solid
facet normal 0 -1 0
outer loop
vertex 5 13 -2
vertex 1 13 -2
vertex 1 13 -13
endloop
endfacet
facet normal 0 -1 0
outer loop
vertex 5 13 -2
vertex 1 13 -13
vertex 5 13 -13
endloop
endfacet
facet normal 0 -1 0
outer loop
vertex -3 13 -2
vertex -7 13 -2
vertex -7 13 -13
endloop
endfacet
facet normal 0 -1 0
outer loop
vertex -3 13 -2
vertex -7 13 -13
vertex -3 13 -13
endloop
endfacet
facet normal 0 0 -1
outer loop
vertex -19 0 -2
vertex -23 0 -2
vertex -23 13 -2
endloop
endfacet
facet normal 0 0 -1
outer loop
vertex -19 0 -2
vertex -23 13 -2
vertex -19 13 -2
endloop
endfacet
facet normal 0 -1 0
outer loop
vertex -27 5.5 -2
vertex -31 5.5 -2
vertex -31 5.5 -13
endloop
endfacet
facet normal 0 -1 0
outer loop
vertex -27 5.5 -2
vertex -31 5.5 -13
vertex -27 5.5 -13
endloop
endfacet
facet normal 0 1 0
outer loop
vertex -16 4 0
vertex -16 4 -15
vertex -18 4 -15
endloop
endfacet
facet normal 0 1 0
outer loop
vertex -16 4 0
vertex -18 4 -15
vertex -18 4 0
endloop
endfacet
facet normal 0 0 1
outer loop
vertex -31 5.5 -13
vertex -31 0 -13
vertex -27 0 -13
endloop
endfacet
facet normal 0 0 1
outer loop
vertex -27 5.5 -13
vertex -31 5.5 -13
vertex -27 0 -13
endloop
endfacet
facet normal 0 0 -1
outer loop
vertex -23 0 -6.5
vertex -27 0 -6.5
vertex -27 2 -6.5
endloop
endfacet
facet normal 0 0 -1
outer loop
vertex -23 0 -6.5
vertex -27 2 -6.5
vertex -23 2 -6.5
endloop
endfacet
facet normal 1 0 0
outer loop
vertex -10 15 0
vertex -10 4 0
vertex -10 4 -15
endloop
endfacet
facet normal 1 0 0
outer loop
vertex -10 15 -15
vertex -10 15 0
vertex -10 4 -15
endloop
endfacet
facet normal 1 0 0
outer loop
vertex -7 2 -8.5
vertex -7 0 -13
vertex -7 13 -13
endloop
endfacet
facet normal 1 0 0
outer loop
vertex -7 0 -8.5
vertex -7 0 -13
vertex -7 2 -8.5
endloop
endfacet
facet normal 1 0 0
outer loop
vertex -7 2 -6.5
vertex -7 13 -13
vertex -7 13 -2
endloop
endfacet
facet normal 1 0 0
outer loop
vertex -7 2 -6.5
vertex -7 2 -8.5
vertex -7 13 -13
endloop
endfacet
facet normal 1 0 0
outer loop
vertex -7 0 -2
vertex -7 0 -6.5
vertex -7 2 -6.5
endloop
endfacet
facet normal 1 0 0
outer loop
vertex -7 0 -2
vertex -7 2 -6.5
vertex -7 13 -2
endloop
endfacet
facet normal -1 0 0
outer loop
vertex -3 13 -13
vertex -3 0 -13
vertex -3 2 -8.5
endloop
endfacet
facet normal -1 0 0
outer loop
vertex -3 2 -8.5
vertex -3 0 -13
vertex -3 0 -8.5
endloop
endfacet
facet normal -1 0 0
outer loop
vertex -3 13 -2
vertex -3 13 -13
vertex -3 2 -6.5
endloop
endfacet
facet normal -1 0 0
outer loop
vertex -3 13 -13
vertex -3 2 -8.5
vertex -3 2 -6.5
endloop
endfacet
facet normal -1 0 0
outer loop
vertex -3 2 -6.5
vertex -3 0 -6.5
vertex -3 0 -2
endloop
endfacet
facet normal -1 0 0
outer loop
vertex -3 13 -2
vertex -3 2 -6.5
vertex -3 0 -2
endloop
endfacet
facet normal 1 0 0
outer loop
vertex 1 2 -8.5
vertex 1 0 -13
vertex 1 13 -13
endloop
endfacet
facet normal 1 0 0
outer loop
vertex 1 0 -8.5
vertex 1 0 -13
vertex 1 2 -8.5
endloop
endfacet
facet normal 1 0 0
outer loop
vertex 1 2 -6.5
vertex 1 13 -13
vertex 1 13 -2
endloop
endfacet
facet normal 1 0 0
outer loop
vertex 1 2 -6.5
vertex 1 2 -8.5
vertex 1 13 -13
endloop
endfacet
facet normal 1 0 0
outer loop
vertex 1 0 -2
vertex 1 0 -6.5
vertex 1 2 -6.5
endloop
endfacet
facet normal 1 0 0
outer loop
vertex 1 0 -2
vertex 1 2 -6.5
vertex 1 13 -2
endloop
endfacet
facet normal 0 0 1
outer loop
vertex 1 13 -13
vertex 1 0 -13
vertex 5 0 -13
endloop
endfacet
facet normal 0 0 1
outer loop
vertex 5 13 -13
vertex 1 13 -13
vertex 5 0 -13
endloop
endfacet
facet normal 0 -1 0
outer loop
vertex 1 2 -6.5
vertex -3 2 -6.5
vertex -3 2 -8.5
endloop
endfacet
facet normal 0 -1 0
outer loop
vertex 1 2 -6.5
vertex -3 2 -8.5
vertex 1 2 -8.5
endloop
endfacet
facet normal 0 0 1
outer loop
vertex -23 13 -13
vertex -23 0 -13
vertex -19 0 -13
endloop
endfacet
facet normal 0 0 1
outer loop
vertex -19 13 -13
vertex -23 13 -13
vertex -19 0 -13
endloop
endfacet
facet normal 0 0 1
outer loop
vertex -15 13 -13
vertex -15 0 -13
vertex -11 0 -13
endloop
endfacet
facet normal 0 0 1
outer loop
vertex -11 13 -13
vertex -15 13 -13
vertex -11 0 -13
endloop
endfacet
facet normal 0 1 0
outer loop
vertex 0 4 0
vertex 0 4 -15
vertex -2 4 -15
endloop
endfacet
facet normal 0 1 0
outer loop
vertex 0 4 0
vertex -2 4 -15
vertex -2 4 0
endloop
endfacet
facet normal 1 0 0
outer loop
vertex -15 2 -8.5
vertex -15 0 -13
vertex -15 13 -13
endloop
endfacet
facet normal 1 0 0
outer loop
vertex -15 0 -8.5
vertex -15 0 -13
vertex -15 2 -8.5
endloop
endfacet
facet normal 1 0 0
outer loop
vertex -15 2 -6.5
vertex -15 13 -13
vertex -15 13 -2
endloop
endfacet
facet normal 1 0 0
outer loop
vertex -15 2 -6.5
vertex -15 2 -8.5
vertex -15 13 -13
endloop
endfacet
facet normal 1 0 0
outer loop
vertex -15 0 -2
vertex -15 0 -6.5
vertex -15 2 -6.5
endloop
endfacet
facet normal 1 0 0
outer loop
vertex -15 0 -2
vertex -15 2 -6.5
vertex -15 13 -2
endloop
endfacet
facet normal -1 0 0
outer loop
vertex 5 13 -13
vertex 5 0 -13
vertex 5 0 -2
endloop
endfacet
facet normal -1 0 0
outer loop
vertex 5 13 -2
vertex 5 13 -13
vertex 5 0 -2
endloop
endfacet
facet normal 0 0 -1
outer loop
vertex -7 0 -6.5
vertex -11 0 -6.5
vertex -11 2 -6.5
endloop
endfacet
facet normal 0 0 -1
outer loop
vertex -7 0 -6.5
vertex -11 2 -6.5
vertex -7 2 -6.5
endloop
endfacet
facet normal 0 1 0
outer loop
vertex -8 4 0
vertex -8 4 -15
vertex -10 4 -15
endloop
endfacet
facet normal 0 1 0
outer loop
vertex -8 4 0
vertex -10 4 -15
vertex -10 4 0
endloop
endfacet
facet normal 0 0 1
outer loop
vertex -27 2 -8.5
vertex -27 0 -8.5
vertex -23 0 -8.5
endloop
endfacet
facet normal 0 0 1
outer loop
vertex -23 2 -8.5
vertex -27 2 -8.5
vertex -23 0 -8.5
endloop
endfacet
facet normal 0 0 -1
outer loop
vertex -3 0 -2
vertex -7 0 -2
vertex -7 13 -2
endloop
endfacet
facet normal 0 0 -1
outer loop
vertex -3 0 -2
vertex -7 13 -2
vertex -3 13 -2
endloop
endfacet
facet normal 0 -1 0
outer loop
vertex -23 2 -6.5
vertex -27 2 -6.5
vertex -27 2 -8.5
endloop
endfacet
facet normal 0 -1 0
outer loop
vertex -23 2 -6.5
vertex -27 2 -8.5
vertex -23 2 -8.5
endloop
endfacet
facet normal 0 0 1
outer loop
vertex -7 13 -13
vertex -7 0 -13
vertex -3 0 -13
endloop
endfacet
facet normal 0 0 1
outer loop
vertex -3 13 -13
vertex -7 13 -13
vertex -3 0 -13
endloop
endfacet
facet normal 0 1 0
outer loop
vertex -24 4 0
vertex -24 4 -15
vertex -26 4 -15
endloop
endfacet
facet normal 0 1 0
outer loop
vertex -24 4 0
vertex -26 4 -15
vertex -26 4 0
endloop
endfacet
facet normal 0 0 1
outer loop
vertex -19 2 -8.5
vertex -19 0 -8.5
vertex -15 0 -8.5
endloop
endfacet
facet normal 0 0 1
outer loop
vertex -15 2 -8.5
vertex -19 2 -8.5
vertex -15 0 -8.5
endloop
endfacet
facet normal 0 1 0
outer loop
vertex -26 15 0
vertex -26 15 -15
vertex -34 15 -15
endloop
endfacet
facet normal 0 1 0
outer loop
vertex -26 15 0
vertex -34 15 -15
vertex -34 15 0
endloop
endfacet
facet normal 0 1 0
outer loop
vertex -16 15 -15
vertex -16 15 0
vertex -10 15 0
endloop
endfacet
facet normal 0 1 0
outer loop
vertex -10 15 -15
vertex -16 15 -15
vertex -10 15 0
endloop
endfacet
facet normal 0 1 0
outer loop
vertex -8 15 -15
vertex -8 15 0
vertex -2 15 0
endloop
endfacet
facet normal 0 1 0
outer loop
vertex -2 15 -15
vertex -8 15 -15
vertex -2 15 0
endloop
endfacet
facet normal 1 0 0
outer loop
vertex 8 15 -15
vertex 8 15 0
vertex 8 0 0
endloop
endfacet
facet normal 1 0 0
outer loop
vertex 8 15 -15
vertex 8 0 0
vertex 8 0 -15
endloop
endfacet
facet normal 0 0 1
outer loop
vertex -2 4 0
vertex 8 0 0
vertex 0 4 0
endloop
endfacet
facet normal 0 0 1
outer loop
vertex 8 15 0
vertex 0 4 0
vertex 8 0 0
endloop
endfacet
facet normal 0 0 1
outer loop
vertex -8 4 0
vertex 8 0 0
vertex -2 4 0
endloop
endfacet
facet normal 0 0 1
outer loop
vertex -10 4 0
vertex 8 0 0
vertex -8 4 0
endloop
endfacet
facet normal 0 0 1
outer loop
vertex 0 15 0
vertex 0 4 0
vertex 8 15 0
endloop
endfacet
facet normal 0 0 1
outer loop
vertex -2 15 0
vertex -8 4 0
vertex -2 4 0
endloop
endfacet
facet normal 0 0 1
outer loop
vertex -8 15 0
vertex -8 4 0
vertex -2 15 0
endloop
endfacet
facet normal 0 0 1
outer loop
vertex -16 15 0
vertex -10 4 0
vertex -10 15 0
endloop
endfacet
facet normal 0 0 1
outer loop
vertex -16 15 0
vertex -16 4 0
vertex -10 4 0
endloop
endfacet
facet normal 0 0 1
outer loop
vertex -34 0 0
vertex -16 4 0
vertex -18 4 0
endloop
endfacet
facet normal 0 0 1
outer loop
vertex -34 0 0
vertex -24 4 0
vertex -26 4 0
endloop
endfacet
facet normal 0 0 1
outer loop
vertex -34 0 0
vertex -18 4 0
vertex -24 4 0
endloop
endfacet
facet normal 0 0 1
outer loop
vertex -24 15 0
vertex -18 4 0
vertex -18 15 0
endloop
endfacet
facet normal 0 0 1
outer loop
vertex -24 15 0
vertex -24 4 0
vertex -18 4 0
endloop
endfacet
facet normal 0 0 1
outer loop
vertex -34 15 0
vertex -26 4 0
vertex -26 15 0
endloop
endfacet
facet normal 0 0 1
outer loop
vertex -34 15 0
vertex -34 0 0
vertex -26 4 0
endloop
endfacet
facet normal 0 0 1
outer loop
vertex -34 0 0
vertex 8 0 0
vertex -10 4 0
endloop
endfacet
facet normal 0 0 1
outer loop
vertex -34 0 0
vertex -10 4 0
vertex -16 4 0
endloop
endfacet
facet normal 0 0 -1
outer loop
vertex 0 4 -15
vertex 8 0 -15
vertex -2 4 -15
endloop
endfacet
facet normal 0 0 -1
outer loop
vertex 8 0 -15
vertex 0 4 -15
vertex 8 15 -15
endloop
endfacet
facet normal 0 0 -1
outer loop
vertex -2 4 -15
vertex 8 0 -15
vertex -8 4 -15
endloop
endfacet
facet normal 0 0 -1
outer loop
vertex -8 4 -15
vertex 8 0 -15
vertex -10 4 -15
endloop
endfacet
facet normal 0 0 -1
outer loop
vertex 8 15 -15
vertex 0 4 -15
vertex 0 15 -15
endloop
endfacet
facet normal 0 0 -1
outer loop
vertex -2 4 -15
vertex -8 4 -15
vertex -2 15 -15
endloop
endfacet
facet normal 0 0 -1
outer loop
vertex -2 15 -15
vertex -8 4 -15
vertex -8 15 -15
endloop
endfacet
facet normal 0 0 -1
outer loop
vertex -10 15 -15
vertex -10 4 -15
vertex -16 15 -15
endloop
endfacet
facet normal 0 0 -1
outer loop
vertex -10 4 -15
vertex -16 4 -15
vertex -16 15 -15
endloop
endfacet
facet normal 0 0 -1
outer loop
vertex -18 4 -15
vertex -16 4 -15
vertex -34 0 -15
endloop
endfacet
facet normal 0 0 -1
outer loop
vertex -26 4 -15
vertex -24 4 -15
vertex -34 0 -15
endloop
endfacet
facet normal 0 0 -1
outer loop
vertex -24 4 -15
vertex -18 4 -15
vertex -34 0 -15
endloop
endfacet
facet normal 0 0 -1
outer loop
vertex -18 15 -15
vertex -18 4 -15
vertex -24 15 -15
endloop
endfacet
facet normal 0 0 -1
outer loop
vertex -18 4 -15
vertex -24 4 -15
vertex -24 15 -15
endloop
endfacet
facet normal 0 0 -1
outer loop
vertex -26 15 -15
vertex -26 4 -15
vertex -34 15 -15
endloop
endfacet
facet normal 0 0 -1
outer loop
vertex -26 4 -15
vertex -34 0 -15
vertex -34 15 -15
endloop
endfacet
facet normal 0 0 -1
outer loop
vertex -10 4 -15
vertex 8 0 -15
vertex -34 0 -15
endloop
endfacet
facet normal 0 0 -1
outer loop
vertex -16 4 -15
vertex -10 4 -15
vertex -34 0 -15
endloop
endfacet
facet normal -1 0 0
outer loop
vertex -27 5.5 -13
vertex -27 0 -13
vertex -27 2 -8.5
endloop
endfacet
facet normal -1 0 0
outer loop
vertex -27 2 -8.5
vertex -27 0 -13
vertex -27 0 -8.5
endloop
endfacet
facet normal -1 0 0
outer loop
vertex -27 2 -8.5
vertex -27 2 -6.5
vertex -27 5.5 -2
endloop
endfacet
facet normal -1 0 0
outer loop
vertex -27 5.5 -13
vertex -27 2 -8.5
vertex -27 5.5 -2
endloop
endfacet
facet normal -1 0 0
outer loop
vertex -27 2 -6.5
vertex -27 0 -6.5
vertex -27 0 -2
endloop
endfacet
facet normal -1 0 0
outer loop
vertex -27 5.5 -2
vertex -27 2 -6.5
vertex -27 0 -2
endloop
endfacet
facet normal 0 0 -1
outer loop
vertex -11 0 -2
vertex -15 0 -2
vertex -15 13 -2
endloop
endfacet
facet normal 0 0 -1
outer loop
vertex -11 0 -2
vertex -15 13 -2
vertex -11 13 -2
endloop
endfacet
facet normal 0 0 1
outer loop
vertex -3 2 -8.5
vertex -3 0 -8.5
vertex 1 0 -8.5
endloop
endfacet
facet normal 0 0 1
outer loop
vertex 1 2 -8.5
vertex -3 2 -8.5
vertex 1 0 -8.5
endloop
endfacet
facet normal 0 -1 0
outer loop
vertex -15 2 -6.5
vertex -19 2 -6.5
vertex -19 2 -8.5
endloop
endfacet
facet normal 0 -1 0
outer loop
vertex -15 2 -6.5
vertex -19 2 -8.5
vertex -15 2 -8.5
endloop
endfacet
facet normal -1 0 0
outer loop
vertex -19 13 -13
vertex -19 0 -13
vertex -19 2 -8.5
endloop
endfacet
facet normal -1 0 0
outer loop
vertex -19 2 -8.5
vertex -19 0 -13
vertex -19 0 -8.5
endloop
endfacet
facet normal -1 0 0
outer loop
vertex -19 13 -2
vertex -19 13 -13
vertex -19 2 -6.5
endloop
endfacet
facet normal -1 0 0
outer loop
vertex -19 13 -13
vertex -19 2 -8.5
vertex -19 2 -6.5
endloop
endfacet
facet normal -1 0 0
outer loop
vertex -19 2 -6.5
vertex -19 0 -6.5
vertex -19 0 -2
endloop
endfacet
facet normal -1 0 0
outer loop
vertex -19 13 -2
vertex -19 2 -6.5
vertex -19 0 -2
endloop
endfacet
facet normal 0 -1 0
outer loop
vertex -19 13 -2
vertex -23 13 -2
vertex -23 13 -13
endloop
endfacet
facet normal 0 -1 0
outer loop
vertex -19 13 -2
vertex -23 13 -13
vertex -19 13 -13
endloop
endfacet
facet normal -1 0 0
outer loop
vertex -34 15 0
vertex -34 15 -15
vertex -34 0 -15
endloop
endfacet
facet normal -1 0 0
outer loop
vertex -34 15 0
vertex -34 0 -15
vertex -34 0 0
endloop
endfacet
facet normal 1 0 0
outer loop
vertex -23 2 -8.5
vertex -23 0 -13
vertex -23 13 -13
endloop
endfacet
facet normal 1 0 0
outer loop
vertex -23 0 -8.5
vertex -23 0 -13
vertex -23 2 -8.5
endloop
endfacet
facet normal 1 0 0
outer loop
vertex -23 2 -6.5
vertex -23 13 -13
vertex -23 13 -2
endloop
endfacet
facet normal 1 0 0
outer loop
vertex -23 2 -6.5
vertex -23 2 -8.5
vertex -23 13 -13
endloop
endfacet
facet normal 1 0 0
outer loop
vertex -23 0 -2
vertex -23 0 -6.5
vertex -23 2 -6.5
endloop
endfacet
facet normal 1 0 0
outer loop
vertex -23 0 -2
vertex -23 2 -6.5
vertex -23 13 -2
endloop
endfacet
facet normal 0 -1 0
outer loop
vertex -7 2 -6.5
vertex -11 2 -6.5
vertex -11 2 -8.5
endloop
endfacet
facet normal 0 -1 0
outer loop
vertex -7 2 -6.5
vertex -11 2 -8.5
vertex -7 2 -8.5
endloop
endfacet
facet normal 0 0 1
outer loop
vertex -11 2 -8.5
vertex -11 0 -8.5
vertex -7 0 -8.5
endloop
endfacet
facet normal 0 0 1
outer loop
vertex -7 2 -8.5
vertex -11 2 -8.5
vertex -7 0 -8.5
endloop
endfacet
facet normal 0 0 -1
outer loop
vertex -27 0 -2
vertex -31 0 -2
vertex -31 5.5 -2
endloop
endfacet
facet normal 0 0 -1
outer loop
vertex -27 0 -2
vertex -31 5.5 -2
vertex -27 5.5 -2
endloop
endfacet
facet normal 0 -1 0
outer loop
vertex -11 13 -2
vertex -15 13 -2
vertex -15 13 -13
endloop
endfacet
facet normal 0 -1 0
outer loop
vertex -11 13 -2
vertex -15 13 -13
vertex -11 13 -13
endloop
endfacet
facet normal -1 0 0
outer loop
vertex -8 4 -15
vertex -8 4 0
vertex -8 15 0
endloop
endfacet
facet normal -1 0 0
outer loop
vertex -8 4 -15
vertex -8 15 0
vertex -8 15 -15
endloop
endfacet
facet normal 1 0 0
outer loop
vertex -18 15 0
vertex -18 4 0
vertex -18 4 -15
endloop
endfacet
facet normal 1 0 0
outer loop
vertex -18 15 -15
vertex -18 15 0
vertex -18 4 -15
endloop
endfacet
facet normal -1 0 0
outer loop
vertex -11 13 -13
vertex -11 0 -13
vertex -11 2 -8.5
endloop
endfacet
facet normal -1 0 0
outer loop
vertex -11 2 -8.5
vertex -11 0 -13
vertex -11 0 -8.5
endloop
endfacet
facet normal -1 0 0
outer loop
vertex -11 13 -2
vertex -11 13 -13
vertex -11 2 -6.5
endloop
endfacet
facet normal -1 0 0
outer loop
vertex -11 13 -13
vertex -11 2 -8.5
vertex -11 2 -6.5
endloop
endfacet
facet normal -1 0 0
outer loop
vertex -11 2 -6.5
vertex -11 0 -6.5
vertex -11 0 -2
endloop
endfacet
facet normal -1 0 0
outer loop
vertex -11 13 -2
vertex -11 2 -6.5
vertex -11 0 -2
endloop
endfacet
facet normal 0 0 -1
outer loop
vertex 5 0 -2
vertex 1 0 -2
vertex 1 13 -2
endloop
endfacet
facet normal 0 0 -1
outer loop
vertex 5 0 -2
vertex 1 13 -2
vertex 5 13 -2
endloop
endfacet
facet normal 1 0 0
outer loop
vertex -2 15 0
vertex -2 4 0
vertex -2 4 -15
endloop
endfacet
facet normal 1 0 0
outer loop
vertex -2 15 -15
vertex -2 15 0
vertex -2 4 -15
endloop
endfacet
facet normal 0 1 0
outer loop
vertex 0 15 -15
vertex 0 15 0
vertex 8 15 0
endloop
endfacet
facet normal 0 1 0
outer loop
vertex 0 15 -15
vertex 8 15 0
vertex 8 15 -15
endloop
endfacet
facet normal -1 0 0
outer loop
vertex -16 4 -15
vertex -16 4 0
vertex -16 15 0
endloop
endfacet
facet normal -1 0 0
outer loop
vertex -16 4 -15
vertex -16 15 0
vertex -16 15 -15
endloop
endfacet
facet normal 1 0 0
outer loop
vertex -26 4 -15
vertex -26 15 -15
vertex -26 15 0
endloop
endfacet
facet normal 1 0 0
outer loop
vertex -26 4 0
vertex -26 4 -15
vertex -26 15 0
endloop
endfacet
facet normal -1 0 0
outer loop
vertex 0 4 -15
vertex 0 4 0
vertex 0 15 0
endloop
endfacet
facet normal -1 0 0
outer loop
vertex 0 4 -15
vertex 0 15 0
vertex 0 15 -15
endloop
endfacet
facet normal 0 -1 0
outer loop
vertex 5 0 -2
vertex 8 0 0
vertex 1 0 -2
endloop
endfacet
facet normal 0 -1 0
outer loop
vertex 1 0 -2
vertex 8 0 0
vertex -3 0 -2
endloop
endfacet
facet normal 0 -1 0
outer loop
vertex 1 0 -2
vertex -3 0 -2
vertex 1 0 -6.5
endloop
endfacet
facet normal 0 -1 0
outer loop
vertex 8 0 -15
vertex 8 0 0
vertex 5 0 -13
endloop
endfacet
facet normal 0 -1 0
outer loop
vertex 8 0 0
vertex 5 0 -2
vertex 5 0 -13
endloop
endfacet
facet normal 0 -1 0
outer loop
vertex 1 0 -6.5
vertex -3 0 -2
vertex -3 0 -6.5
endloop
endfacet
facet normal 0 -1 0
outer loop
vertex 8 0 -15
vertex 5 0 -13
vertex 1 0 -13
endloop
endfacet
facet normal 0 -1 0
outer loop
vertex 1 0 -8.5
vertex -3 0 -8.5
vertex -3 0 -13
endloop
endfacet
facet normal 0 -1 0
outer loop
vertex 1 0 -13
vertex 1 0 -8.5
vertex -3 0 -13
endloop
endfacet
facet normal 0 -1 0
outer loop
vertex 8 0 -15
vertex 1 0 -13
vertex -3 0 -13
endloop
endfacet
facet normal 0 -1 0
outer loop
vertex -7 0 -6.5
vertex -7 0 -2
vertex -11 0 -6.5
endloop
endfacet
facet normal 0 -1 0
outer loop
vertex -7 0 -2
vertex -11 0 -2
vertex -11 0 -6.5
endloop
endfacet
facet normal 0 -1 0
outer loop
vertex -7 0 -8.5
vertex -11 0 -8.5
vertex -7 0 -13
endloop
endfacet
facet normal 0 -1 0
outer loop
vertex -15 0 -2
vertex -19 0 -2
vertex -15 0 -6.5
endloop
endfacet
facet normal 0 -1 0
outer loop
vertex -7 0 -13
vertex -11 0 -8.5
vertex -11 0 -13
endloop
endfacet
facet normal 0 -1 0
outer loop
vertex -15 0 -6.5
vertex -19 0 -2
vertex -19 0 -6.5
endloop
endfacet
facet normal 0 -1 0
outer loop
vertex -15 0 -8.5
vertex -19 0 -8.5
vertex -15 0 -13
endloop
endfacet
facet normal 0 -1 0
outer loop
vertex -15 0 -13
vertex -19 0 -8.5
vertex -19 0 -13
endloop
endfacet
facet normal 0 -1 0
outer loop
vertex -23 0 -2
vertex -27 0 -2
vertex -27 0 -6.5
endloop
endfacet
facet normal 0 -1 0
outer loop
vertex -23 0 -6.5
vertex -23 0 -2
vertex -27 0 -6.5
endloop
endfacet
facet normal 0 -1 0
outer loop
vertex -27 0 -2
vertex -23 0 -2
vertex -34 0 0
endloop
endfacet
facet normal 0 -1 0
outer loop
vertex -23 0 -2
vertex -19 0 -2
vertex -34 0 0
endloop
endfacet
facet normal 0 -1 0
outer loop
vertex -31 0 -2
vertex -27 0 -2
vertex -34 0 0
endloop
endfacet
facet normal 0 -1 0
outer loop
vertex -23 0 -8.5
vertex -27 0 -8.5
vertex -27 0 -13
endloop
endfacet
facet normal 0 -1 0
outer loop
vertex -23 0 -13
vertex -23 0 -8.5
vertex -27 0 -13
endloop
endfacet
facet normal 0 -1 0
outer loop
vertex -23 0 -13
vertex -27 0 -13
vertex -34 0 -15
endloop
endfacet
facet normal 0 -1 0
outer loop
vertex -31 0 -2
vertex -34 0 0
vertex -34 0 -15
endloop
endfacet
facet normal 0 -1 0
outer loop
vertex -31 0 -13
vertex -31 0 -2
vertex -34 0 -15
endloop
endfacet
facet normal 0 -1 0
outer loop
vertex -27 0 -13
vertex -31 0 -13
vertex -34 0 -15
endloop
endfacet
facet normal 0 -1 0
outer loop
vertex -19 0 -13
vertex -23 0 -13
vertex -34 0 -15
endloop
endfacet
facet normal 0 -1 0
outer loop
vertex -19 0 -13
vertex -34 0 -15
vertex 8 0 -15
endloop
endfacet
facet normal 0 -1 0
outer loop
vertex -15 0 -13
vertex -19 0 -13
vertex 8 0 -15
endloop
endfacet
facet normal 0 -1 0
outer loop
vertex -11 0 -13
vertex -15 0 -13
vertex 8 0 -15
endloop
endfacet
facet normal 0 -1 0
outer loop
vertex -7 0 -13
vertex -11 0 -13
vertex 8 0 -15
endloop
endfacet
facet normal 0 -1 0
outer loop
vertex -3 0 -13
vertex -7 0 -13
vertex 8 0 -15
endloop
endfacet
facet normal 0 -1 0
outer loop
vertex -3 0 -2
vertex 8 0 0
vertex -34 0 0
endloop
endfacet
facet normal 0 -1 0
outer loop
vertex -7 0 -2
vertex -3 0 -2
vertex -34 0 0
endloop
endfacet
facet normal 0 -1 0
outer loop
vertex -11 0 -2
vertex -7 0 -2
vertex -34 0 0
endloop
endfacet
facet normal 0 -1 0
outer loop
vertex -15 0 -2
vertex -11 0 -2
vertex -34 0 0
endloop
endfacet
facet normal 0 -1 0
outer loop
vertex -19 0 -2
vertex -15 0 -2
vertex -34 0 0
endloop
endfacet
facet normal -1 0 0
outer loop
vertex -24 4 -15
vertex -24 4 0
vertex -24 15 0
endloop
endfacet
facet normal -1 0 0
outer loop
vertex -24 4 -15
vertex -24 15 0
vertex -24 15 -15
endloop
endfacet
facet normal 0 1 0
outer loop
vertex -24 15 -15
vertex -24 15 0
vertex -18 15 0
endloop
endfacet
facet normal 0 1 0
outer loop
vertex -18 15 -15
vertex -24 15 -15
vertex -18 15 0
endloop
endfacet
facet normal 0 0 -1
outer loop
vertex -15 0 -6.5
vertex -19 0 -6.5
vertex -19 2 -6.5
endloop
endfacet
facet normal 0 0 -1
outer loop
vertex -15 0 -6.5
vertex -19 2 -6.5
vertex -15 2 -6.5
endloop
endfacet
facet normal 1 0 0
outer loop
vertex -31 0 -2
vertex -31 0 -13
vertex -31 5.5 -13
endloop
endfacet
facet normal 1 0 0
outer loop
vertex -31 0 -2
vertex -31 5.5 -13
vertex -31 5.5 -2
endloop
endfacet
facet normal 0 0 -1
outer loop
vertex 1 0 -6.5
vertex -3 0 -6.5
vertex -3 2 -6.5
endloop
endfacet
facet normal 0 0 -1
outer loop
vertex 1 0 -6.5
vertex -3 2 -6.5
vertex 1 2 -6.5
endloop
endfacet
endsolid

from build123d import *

# Parameters (mm, degrees)
SKETCH1_W           = 6
SKETCH1_H           = 15
BOSS_EXTRUDE1_DEPTH = 15
SKETCH2_W           = 4
SKETCH2_H           = 11
CUT_EXTRUDE1_DEPTH  = 13
SKETCH3_W           = 15
SKETCH3_H           = 4
BOSS_EXTRUDE2_DEPTH = 2
LPATTERN1_COUNT     = 4
LPATTERN1_PITCH     = 8
SKETCH4_W           = 15
SKETCH4_H           = 15
BOSS_EXTRUDE3_DEPTH = 8
SKETCH5_W           = 4
SKETCH5_H           = 11
CUT_EXTRUDE2_DEPTH  = 5.5
SKETCH6_W           = 15
SKETCH6_H           = 15
BOSS_EXTRUDE4_DEPTH = 2
SKETCH7_W           = 36
SKETCH7_H           = 2
CUT_EXTRUDE3_DEPTH  = 2


with BuildPart() as part:
    # Sketch1 → Boss-Extrude1 (new body)
    with BuildSketch(Plane(origin=(0, 0, 0), x_dir=(1, 0, 0), z_dir=(0, 1, 0))):
        with Locations((3, 7.5)):
            Rectangle(SKETCH1_W, SKETCH1_H)
    extrude(amount=BOSS_EXTRUDE1_DEPTH)

    # Sketch2 → Cut-Extrude1 (cut)
    with BuildSketch(Plane.XZ):
        with Locations((3, -7.5)):
            Rectangle(SKETCH2_W, SKETCH2_H)
    extrude(amount=-CUT_EXTRUDE1_DEPTH, mode=Mode.SUBTRACT)

    # Sketch3 → Boss-Extrude2 (add)
    with BuildSketch(Plane.ZY):
        with Locations((-7.5, 2)):
            Rectangle(SKETCH3_W, SKETCH3_H)
    extrude(amount=BOSS_EXTRUDE2_DEPTH)


with BuildPart() as lpattern1_1:
    # LPattern1: pattern copy
    add(part.part.moved(Location(Vector(-1, 0, 0) * (1 * LPATTERN1_PITCH))))


with BuildPart() as lpattern1_2:
    # LPattern1: pattern copy
    add(part.part.moved(Location(Vector(-1, 0, 0) * (2 * LPATTERN1_PITCH))))


with BuildPart() as lpattern1_3:
    # LPattern1: pattern copy
    add(part.part.moved(Location(Vector(-1, 0, 0) * (3 * LPATTERN1_PITCH))))

    # Sketch4 → Boss-Extrude3 (add)
    with BuildSketch(Plane.ZY.offset(26)):
        with Locations((-7.5, 7.5)):
            Rectangle(SKETCH4_W, SKETCH4_H)
    extrude(amount=BOSS_EXTRUDE3_DEPTH)

    # Sketch5 → Cut-Extrude2 (cut)
    with BuildSketch(Plane.XZ):
        with Locations((-29, -7.5)):
            Rectangle(SKETCH5_W, SKETCH5_H)
    extrude(amount=-CUT_EXTRUDE2_DEPTH, mode=Mode.SUBTRACT)


with BuildPart() as lpattern1_1_1:
    add(lpattern1_1.part)

    # Combine1: union LPattern1_2, LPattern1_3, part
    add(lpattern1_2.part)
    add(lpattern1_3.part)
    add(part.part)

    # Sketch6 → Boss-Extrude4 (add)
    with BuildSketch(Plane(origin=(6, 0, 0), x_dir=(0, 0, -1), z_dir=(1, 0, 0))):
        with Locations((7.5, 7.5)):
            Rectangle(SKETCH6_W, SKETCH6_H)
    extrude(amount=BOSS_EXTRUDE4_DEPTH)

    # Sketch7 → Cut-Extrude3 (cut)
    with BuildSketch(Plane.XZ):
        with Locations((-13, -7.5)):
            Rectangle(SKETCH7_W, SKETCH7_H)
    extrude(amount=-CUT_EXTRUDE3_DEPTH, mode=Mode.SUBTRACT)


solid = lpattern1_1_1.part
